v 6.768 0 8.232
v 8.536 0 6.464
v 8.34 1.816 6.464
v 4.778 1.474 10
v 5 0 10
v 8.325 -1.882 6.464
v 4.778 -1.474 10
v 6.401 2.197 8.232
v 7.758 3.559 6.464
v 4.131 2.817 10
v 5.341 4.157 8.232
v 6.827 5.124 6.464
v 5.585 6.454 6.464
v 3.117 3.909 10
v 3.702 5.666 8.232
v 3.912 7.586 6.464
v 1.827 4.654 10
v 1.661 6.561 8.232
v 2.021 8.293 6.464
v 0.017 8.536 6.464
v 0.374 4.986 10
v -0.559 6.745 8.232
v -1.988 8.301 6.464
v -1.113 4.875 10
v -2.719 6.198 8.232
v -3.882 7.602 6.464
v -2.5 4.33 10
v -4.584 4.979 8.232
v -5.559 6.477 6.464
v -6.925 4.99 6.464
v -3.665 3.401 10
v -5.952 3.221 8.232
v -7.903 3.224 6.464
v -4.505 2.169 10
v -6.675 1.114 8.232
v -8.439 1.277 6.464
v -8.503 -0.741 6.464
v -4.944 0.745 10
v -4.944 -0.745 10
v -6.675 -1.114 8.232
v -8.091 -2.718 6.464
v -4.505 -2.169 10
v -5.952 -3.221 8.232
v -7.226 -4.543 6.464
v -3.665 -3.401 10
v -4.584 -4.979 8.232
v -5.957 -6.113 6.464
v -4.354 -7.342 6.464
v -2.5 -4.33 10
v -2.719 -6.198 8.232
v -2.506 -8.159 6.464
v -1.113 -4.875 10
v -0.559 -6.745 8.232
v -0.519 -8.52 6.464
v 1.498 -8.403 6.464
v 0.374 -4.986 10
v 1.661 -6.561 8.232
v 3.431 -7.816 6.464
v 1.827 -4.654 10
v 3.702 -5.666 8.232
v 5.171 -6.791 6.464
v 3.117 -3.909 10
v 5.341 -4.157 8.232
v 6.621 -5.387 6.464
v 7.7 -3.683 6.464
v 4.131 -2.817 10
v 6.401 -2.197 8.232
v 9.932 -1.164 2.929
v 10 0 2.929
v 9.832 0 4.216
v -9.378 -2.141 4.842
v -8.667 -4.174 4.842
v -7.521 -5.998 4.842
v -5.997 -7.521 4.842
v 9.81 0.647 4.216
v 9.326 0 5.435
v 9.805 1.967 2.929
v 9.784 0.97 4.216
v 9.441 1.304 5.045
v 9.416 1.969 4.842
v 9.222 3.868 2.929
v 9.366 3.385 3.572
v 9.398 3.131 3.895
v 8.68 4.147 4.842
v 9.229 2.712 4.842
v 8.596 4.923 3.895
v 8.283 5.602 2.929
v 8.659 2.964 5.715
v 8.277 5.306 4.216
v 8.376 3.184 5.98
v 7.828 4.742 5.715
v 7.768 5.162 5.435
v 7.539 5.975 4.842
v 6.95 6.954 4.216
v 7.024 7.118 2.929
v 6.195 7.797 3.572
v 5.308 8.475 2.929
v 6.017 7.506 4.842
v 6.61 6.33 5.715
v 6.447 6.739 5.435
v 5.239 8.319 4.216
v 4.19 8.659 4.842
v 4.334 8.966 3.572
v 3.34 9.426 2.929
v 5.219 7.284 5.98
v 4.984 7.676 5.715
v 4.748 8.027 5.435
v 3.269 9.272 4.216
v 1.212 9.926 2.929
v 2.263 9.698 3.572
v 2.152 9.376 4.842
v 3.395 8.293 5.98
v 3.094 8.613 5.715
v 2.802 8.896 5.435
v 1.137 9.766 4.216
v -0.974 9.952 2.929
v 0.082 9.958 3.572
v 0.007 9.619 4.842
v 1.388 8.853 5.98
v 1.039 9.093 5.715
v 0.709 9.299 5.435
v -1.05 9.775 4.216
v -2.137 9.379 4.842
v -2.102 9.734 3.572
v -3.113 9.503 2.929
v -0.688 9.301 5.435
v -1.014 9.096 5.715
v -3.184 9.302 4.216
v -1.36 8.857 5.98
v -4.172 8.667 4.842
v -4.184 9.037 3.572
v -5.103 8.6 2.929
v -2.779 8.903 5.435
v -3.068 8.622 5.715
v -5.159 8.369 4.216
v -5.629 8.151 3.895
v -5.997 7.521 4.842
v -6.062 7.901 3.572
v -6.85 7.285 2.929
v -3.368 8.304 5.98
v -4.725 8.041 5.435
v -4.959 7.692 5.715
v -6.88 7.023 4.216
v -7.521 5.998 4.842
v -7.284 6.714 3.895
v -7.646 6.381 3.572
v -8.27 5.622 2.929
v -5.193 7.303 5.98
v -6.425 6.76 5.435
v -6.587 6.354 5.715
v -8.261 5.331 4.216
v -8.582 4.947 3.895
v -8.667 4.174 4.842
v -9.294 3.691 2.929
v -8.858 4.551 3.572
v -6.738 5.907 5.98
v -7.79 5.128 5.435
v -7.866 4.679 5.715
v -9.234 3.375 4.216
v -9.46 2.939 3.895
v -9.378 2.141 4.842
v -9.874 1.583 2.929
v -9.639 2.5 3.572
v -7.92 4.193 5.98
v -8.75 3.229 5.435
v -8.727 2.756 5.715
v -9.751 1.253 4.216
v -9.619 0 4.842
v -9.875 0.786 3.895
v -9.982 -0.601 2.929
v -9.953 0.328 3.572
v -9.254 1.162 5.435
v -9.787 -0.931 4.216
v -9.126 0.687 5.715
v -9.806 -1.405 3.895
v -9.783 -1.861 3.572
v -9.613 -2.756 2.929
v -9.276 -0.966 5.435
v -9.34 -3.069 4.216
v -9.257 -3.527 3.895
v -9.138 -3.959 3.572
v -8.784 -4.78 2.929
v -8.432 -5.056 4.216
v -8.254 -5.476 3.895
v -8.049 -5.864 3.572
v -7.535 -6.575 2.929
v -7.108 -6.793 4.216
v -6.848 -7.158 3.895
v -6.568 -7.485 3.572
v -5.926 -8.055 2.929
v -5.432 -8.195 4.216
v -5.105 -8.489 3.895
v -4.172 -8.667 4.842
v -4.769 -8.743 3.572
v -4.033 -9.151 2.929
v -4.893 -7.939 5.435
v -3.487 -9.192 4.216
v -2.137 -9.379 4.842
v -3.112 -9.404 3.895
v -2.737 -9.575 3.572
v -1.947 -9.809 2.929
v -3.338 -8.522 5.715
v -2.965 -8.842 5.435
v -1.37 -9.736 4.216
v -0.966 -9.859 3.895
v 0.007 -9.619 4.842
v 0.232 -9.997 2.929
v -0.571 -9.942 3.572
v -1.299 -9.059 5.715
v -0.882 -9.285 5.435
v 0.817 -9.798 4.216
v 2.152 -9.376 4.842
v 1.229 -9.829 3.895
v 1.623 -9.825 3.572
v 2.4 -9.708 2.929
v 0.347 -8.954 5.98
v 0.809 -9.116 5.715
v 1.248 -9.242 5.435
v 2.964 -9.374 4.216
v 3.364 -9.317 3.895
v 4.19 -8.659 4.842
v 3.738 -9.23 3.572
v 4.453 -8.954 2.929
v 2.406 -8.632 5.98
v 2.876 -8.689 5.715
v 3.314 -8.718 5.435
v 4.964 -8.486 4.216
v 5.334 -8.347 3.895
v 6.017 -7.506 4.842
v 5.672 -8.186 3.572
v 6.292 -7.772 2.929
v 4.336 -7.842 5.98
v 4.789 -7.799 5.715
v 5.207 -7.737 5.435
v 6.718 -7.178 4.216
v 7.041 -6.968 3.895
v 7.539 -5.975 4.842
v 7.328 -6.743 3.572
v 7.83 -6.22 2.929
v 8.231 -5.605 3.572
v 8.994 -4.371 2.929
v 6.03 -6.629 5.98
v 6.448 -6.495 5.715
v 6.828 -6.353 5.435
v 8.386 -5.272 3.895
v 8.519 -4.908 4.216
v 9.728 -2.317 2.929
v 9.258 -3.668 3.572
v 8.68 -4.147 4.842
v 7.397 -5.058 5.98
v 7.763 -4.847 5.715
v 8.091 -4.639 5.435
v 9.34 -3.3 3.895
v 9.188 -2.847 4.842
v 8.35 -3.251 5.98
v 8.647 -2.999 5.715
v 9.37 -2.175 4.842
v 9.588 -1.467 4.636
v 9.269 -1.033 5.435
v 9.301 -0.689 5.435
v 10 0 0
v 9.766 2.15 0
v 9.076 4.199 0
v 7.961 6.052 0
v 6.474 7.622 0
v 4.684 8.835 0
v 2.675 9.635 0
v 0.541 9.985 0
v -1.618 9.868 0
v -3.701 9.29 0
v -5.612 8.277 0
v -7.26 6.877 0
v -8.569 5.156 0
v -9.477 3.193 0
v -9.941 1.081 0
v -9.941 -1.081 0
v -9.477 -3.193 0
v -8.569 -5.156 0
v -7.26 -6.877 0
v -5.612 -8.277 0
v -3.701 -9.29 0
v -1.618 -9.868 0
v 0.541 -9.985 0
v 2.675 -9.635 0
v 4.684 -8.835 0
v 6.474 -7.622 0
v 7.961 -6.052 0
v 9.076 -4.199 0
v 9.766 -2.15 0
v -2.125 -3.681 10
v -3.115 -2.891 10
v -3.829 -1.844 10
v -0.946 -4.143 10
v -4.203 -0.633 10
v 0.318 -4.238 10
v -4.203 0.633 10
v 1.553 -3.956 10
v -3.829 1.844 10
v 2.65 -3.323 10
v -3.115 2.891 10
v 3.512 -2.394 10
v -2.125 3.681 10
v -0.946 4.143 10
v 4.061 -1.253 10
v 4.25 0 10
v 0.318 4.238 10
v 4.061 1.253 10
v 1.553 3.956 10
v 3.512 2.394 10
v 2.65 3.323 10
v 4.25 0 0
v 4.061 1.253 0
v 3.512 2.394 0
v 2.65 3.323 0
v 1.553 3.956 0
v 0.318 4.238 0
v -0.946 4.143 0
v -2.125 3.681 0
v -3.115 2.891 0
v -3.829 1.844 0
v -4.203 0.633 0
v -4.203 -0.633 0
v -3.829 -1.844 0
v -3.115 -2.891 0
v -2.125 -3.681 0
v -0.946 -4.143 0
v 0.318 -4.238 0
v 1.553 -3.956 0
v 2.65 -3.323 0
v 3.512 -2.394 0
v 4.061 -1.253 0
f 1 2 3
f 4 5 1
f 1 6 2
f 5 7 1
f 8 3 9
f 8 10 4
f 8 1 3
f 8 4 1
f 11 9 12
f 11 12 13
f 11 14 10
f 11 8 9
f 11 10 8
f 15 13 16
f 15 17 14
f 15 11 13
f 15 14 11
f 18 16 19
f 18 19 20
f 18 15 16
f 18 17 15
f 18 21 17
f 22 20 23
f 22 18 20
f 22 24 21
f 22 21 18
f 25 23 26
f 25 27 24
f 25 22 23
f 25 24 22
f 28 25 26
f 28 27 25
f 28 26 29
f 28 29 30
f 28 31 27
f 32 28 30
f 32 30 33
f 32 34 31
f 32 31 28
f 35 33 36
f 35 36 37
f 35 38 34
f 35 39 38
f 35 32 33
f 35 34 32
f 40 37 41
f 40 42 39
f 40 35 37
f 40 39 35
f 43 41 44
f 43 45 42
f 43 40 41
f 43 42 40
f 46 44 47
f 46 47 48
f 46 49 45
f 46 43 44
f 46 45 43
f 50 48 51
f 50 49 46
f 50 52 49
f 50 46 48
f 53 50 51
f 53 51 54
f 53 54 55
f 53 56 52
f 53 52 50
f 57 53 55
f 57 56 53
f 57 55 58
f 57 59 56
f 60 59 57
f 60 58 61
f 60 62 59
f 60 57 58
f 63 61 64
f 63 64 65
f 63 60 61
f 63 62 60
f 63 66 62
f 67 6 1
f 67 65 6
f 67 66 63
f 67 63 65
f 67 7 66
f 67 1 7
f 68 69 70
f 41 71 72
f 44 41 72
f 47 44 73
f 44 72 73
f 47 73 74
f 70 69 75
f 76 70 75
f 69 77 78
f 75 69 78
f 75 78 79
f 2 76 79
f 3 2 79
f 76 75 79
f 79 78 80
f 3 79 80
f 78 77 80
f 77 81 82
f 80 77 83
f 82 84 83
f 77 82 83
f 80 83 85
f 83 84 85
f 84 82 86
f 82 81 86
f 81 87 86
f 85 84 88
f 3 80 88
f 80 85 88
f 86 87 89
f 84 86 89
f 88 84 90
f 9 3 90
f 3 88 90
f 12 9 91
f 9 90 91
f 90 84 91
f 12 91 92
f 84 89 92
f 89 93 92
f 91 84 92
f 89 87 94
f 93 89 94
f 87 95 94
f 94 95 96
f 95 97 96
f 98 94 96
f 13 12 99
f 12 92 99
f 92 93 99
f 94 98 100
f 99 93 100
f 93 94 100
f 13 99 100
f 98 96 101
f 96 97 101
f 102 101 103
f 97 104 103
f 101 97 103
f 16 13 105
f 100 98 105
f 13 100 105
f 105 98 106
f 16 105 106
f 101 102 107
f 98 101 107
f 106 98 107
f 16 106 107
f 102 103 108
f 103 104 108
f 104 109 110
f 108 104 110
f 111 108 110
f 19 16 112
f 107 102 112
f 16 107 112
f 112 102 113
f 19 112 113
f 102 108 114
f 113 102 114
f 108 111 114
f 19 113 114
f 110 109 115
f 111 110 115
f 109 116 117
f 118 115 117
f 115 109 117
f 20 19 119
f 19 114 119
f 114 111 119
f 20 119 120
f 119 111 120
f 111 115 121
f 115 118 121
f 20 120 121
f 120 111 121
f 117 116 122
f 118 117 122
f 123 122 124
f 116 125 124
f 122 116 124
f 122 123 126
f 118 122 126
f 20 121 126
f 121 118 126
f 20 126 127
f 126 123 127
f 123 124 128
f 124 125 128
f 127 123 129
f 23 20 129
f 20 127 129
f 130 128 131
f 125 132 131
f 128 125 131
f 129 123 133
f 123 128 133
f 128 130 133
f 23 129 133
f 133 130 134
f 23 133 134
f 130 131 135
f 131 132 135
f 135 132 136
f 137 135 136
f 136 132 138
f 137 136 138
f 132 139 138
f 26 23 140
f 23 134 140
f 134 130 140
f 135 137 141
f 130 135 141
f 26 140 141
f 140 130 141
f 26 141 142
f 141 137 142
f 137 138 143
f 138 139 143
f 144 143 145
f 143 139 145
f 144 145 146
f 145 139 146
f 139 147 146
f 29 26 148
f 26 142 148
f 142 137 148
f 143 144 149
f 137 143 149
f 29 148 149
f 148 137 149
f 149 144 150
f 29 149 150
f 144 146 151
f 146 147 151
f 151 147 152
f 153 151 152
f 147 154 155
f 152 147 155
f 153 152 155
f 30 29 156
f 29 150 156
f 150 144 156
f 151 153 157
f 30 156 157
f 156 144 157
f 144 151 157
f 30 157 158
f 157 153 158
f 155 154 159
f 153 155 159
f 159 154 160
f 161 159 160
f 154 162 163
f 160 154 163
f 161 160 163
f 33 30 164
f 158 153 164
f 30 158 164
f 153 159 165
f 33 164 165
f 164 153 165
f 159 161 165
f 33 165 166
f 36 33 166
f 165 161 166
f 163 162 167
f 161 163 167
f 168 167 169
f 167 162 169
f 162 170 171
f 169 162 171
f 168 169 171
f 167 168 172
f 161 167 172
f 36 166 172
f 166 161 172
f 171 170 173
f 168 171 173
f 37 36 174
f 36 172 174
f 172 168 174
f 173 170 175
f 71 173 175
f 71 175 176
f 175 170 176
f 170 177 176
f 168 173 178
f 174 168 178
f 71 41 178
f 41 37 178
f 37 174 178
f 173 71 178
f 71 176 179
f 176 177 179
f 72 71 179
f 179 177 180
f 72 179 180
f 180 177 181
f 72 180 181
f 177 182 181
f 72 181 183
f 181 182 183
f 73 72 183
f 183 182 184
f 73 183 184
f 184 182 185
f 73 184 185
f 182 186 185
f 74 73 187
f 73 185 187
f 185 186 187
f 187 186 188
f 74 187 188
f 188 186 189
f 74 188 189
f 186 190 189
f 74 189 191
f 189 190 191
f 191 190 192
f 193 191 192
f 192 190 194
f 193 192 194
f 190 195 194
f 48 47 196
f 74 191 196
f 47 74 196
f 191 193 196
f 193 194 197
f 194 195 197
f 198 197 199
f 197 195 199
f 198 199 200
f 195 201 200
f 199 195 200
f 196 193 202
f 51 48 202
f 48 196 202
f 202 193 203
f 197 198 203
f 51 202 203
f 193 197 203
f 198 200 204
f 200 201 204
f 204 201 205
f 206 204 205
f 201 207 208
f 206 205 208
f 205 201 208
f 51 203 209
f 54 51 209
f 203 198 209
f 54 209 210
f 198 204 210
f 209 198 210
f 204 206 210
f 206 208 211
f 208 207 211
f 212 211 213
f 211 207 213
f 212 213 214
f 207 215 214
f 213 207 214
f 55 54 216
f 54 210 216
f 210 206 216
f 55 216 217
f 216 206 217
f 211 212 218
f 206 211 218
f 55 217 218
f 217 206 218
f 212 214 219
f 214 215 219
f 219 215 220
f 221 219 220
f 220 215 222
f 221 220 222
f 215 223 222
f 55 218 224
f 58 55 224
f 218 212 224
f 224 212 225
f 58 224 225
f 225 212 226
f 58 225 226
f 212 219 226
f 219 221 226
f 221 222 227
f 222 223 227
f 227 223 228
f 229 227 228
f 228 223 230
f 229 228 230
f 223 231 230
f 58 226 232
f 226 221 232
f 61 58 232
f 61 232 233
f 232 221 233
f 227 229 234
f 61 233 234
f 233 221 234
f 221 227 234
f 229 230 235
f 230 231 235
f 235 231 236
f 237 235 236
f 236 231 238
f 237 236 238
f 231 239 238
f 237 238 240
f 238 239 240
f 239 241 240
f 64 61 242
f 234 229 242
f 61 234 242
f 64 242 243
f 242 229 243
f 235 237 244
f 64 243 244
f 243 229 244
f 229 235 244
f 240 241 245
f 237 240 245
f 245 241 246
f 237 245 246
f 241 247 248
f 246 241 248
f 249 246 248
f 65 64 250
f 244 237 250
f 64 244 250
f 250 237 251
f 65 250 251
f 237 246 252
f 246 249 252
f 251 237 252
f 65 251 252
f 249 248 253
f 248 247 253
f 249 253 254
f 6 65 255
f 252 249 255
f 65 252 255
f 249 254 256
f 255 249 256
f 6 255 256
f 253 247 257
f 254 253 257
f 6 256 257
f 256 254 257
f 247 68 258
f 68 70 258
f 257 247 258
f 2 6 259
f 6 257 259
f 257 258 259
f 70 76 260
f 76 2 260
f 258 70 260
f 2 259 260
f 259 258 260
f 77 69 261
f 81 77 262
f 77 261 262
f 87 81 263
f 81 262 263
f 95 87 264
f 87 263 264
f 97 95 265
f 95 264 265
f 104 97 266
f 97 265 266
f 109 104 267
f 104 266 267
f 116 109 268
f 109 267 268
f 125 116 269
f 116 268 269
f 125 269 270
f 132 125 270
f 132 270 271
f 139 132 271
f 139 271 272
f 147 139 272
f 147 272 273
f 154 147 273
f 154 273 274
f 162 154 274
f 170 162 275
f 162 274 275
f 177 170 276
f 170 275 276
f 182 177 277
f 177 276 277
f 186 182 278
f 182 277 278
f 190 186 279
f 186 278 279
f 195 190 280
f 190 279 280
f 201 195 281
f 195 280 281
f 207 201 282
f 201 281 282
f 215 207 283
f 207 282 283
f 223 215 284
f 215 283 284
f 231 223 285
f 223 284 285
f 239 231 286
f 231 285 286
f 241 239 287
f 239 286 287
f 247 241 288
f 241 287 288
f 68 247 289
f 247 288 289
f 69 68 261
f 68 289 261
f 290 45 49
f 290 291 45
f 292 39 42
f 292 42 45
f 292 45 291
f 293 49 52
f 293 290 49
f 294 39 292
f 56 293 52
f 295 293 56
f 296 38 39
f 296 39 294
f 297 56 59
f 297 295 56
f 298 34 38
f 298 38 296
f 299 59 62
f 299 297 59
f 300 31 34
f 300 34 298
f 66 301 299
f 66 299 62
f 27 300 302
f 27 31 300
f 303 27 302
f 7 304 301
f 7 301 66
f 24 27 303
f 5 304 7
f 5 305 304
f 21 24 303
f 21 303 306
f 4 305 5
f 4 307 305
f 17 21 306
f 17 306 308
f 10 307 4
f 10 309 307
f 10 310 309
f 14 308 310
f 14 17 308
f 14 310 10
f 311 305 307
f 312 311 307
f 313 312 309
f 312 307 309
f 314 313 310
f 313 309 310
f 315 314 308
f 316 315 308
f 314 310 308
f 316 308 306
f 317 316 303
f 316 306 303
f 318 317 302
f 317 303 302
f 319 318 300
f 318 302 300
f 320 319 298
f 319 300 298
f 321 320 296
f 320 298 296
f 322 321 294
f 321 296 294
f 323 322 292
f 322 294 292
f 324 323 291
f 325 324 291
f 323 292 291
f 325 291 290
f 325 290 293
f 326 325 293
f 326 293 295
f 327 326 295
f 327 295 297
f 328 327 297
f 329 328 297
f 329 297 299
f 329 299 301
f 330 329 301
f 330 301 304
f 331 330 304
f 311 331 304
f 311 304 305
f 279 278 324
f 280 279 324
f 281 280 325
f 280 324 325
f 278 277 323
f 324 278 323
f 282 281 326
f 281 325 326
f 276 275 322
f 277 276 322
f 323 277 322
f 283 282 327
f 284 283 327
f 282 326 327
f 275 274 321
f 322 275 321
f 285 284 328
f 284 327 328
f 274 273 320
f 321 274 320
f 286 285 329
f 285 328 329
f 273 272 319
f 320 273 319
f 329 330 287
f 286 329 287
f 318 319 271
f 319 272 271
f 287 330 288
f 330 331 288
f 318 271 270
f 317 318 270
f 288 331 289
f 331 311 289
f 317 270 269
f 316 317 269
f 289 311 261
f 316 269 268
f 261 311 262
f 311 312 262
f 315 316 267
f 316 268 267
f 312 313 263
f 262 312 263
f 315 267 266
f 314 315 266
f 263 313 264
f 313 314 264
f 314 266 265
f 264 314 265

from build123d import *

# Parameters (mm, degrees)
F0_R     = 10
F1_DEPTH = 10
F2_R     = 4.25
F3_DEPTH = 10.001
F4_SIZE  = 5
F5_R     = 5


with BuildPart() as f1:
    # F0 (on Top) → F1 (new body)
    with BuildSketch(Plane.XY):
        Circle(F0_R)
    extrude(amount=F1_DEPTH)

    # F2 (on face) → F3 (cut, through all)
    with BuildSketch(Plane.XY.offset(10)):
        Circle(F2_R)
    extrude(amount=-F3_DEPTH, mode=Mode.SUBTRACT)

    # F4
    f4_edges = [f1.edges().sort_by_distance(p)[0] for p in [
        (-10, 0, 10),
    ]]
    chamfer(f4_edges, length=F4_SIZE)

    # F5
    f5_edges = [f1.edges().sort_by_distance(p)[0] for p in [
        (-10, 0, 5),
    ]]
    fillet(f5_edges, radius=F5_R)


solid = f1.part
